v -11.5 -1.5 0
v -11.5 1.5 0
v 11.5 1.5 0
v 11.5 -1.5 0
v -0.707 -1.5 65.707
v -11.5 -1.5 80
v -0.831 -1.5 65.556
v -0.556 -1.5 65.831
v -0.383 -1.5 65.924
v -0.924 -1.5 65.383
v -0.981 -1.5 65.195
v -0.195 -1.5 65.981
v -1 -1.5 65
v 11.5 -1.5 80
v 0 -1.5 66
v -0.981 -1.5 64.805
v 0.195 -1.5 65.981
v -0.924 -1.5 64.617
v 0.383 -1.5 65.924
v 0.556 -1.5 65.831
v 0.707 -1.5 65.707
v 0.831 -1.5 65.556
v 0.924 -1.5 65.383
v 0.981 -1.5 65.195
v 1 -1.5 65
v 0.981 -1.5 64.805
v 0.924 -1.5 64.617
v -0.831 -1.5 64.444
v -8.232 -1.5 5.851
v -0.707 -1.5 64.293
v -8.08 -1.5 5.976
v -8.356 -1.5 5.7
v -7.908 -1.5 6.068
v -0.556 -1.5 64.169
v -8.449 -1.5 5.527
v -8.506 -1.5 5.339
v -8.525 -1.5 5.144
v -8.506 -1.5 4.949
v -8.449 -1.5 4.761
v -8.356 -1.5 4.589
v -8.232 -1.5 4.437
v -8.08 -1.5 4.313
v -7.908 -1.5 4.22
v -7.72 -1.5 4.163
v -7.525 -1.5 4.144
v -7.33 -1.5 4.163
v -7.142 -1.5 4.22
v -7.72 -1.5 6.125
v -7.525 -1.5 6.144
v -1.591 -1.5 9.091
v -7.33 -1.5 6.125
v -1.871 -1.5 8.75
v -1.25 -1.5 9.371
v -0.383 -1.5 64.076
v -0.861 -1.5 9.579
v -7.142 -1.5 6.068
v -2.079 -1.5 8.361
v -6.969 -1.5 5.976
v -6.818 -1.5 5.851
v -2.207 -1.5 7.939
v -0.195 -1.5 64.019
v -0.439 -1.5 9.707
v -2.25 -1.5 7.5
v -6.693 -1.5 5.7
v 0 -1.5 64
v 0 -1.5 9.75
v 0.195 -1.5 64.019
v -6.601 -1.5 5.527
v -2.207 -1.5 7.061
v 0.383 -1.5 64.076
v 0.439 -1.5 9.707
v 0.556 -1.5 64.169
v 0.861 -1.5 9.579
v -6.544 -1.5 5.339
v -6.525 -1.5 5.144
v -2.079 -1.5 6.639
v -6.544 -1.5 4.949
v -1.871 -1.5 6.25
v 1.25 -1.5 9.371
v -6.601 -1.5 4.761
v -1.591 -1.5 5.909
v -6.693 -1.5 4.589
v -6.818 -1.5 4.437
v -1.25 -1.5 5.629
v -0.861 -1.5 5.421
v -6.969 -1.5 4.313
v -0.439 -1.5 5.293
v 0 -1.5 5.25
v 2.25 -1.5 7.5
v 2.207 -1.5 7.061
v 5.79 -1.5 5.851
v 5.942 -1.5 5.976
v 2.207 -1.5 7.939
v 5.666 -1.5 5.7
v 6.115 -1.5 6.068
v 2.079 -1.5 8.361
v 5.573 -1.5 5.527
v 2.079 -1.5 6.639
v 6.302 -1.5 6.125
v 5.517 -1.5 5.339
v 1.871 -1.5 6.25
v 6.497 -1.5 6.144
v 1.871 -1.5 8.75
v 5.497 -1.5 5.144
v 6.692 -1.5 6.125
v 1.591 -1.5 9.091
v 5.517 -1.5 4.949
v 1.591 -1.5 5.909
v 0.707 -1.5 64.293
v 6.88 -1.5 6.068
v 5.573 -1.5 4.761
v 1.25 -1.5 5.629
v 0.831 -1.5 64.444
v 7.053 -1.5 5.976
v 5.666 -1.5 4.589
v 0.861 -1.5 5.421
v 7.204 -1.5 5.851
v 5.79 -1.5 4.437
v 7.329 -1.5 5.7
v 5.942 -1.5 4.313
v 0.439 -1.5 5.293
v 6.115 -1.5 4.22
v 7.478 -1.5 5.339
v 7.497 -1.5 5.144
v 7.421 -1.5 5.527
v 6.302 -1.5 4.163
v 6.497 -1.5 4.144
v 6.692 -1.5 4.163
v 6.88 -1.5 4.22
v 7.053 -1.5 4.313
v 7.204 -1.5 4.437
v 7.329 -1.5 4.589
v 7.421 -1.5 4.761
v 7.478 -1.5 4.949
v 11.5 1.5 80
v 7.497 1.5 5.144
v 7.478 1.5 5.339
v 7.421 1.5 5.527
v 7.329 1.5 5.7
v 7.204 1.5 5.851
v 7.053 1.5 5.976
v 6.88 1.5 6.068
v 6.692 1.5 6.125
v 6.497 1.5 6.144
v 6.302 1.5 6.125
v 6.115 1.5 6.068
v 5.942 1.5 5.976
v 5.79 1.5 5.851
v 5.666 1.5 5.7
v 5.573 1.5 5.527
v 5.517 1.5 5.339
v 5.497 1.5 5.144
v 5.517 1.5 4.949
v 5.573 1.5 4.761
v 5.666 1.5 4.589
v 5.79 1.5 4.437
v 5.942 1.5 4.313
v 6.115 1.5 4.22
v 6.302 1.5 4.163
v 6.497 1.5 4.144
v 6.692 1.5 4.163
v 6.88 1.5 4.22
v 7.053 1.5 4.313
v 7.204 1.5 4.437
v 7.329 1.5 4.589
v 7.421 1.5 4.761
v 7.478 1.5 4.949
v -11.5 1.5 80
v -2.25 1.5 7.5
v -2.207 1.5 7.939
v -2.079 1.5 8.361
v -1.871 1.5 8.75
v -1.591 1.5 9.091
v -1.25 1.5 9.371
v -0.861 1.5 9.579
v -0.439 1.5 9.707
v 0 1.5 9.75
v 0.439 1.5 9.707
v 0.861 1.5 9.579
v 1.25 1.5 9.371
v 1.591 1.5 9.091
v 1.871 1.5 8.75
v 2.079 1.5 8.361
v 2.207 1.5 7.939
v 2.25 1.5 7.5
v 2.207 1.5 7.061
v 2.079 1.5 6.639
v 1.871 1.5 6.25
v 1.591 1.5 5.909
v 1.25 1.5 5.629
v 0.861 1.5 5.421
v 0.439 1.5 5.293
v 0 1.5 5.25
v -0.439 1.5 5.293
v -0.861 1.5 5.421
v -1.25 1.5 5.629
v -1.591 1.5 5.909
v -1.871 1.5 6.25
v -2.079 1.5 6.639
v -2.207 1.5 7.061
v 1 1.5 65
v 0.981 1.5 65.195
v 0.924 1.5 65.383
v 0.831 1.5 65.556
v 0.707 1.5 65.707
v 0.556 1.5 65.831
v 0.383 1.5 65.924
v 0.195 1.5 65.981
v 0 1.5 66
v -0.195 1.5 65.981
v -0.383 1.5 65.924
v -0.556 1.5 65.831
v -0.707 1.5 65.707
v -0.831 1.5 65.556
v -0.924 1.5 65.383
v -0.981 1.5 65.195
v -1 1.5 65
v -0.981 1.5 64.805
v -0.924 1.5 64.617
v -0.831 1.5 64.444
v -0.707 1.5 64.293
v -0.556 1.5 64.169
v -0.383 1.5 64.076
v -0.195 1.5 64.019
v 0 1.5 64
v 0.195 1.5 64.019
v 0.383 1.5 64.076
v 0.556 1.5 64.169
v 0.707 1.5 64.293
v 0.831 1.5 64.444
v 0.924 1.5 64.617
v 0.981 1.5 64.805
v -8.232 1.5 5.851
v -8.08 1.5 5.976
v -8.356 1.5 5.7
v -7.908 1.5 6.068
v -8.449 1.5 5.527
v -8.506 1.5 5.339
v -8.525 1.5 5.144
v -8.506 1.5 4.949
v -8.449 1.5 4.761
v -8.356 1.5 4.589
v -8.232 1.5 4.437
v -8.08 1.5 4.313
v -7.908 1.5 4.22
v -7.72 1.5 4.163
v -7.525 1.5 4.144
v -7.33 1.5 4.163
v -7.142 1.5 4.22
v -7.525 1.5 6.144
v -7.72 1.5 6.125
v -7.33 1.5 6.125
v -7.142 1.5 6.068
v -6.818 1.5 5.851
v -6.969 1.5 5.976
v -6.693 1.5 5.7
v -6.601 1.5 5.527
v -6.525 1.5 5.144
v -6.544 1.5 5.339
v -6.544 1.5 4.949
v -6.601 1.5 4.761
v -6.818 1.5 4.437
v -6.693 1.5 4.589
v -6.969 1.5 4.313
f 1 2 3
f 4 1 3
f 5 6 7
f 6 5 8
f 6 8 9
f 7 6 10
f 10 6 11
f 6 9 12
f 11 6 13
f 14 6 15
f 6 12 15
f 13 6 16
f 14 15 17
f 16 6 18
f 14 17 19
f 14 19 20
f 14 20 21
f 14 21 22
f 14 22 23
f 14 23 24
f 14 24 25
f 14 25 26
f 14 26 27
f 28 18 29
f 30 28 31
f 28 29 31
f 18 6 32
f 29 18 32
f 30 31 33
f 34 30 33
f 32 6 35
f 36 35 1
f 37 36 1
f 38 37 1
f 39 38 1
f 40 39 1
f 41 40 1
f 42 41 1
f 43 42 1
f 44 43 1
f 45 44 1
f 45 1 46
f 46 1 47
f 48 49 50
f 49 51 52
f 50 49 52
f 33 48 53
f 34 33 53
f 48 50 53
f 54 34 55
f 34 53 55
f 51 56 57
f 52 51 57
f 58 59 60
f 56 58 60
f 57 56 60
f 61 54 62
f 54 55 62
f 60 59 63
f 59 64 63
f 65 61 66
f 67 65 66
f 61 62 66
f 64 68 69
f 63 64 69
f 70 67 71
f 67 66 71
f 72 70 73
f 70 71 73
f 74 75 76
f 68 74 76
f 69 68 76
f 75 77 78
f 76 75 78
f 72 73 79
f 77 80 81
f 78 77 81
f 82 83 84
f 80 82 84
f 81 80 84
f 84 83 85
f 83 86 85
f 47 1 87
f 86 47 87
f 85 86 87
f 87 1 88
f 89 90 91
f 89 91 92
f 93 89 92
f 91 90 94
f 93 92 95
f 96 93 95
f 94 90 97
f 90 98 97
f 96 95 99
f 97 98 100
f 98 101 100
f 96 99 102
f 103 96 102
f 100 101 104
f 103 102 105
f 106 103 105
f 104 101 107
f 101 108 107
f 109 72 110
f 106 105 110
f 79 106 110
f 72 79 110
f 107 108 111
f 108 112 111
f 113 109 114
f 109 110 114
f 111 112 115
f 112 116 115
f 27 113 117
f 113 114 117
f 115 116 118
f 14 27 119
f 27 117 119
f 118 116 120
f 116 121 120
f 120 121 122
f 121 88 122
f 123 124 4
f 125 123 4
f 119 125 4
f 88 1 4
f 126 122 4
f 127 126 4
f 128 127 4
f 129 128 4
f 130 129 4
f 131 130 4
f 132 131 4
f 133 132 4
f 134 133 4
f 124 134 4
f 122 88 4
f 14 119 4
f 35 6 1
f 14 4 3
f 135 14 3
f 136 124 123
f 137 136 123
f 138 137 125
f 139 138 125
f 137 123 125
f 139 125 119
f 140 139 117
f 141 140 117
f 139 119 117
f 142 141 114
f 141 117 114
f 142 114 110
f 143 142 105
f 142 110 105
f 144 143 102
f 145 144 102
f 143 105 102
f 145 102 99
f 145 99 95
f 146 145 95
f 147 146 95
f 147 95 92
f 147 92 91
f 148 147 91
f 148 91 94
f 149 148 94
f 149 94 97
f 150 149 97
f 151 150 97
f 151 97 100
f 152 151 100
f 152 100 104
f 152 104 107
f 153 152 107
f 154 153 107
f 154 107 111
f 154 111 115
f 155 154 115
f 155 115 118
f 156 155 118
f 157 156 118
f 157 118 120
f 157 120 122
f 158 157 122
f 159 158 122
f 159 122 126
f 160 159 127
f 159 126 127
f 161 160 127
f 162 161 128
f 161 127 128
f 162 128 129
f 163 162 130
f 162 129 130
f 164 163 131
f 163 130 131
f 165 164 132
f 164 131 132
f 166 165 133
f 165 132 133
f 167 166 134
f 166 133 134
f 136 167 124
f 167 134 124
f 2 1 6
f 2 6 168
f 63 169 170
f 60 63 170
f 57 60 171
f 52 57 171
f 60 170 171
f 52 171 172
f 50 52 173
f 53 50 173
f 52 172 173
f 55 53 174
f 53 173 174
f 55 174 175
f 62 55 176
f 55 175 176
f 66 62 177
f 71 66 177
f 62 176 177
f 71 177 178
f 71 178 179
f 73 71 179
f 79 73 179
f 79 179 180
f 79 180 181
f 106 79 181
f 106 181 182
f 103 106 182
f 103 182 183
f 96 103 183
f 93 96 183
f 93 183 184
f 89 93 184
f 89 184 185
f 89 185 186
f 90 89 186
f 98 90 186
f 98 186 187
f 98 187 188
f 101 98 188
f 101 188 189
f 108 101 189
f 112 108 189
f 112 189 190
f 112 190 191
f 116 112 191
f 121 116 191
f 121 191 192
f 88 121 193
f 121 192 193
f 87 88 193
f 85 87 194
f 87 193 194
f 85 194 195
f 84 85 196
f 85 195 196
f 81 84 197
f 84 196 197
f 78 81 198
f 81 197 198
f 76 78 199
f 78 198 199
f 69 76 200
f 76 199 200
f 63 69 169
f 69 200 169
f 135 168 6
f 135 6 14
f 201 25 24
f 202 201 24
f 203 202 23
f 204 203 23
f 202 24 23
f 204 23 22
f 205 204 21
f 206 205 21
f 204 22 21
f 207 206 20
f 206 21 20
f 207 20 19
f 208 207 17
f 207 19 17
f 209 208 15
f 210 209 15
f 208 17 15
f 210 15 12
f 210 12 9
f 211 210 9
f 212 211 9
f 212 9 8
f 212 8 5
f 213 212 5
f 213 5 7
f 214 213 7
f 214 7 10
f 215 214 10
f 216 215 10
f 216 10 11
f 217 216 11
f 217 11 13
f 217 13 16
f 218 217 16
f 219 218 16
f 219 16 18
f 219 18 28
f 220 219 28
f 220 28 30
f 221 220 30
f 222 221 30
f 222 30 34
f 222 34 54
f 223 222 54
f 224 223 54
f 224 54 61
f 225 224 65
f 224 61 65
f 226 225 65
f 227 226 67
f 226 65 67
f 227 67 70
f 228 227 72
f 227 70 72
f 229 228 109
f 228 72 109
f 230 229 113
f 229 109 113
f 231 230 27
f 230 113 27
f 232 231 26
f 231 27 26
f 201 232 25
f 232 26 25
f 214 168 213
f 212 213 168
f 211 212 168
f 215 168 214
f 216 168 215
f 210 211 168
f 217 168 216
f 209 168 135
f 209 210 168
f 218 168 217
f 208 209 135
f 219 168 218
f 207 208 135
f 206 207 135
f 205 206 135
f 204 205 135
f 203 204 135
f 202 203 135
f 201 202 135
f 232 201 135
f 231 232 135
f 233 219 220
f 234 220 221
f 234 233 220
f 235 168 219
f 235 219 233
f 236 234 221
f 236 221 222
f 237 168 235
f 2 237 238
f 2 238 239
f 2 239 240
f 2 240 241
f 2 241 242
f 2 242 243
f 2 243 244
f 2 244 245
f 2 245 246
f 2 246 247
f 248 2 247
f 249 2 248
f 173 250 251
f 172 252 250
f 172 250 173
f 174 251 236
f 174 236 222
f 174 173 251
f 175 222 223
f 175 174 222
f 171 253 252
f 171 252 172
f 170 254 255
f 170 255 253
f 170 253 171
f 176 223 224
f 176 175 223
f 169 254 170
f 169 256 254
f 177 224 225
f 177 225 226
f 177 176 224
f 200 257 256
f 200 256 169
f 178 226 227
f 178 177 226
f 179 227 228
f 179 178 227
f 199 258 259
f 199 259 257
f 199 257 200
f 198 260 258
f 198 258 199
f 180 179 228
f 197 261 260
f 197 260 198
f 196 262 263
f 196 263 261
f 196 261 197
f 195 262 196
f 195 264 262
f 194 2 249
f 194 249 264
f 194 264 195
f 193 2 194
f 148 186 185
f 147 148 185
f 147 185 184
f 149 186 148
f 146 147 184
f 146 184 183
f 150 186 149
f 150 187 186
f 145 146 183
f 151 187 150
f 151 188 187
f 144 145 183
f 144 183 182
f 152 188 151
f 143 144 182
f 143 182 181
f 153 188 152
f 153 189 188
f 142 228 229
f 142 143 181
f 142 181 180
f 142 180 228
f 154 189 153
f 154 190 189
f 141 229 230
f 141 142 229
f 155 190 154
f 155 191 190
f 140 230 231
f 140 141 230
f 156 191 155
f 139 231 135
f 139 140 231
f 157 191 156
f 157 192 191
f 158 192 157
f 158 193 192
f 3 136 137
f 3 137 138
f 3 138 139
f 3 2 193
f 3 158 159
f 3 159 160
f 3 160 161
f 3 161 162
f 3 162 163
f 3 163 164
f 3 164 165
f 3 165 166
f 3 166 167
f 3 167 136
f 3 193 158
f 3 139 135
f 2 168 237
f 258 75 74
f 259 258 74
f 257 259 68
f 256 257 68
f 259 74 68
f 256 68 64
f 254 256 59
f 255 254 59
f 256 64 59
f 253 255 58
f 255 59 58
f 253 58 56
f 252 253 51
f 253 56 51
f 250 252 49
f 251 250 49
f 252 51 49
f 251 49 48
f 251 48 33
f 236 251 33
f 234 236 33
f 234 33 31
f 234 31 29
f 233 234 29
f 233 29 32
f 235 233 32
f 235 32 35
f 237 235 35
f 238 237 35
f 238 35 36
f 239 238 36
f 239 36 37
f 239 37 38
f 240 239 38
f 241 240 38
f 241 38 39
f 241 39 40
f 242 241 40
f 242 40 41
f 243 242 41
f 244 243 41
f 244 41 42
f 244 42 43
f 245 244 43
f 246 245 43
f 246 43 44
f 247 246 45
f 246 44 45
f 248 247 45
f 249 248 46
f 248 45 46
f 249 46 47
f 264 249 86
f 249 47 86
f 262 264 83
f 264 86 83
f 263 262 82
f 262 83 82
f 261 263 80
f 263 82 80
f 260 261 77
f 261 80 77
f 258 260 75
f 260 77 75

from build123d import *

# Parameters (mm, degrees)
ESQUISSE1_W             = 23
ESQUISSE1_H             = 3
BOSS_EXTRU_1_DEPTH      = 80
ESQUISSE3_R             = 1
ENL_V_MAT_EXTRU_2_DEPTH = 10
ESQUISSE4_R             = 1
ENL_V_MAT_EXTRU_3_DEPTH = 10
ESQUISSE5_R             = 2.25
ENL_V_MAT_EXTRU_4_DEPTH = 81.877994535


with BuildPart() as part:
    # Esquisse1 → Boss.-Extru.1 (new body)
    with BuildSketch(Plane.XY):
        Rectangle(ESQUISSE1_W, ESQUISSE1_H)
    extrude(amount=BOSS_EXTRU_1_DEPTH)

    # Esquisse3 → Enlèv. mat.-Extru.2 (cut)
    with BuildSketch(Plane.XZ.offset(1.5)):
        with Locations((0, 65)):
            Circle(ESQUISSE3_R)
    extrude(amount=-ENL_V_MAT_EXTRU_2_DEPTH, mode=Mode.SUBTRACT)

    # Esquisse4 → Enlèv. mat.-Extru.3 (cut)
    with BuildSketch(Plane(origin=(0, -1.5, 0), x_dir=(-1, 0, 0), z_dir=(0, -1, 0))):
        with Locations(Location((-6.497330661, -5.144161138, 0), (0, 0, 180))):
            Circle(ESQUISSE4_R)
        with Locations(Location((7.524836603, -5.144161138, 0), (0, 0, 180))):
            Circle(ESQUISSE4_R)
    extrude(amount=-ENL_V_MAT_EXTRU_3_DEPTH, mode=Mode.SUBTRACT)

    # Esquisse5 → Enlèv. mat.-Extru.4 (cut, through all)
    with BuildSketch(Plane(origin=(0, 1.5, 0), x_dir=(1, 0, 0), z_dir=(0, 1, 0))):
        with Locations(Location((0, -7.5, 0), (0, 0, 180))):
            Circle(ESQUISSE5_R)
    extrude(amount=-ENL_V_MAT_EXTRU_4_DEPTH, mode=Mode.SUBTRACT)


solid = part.part
